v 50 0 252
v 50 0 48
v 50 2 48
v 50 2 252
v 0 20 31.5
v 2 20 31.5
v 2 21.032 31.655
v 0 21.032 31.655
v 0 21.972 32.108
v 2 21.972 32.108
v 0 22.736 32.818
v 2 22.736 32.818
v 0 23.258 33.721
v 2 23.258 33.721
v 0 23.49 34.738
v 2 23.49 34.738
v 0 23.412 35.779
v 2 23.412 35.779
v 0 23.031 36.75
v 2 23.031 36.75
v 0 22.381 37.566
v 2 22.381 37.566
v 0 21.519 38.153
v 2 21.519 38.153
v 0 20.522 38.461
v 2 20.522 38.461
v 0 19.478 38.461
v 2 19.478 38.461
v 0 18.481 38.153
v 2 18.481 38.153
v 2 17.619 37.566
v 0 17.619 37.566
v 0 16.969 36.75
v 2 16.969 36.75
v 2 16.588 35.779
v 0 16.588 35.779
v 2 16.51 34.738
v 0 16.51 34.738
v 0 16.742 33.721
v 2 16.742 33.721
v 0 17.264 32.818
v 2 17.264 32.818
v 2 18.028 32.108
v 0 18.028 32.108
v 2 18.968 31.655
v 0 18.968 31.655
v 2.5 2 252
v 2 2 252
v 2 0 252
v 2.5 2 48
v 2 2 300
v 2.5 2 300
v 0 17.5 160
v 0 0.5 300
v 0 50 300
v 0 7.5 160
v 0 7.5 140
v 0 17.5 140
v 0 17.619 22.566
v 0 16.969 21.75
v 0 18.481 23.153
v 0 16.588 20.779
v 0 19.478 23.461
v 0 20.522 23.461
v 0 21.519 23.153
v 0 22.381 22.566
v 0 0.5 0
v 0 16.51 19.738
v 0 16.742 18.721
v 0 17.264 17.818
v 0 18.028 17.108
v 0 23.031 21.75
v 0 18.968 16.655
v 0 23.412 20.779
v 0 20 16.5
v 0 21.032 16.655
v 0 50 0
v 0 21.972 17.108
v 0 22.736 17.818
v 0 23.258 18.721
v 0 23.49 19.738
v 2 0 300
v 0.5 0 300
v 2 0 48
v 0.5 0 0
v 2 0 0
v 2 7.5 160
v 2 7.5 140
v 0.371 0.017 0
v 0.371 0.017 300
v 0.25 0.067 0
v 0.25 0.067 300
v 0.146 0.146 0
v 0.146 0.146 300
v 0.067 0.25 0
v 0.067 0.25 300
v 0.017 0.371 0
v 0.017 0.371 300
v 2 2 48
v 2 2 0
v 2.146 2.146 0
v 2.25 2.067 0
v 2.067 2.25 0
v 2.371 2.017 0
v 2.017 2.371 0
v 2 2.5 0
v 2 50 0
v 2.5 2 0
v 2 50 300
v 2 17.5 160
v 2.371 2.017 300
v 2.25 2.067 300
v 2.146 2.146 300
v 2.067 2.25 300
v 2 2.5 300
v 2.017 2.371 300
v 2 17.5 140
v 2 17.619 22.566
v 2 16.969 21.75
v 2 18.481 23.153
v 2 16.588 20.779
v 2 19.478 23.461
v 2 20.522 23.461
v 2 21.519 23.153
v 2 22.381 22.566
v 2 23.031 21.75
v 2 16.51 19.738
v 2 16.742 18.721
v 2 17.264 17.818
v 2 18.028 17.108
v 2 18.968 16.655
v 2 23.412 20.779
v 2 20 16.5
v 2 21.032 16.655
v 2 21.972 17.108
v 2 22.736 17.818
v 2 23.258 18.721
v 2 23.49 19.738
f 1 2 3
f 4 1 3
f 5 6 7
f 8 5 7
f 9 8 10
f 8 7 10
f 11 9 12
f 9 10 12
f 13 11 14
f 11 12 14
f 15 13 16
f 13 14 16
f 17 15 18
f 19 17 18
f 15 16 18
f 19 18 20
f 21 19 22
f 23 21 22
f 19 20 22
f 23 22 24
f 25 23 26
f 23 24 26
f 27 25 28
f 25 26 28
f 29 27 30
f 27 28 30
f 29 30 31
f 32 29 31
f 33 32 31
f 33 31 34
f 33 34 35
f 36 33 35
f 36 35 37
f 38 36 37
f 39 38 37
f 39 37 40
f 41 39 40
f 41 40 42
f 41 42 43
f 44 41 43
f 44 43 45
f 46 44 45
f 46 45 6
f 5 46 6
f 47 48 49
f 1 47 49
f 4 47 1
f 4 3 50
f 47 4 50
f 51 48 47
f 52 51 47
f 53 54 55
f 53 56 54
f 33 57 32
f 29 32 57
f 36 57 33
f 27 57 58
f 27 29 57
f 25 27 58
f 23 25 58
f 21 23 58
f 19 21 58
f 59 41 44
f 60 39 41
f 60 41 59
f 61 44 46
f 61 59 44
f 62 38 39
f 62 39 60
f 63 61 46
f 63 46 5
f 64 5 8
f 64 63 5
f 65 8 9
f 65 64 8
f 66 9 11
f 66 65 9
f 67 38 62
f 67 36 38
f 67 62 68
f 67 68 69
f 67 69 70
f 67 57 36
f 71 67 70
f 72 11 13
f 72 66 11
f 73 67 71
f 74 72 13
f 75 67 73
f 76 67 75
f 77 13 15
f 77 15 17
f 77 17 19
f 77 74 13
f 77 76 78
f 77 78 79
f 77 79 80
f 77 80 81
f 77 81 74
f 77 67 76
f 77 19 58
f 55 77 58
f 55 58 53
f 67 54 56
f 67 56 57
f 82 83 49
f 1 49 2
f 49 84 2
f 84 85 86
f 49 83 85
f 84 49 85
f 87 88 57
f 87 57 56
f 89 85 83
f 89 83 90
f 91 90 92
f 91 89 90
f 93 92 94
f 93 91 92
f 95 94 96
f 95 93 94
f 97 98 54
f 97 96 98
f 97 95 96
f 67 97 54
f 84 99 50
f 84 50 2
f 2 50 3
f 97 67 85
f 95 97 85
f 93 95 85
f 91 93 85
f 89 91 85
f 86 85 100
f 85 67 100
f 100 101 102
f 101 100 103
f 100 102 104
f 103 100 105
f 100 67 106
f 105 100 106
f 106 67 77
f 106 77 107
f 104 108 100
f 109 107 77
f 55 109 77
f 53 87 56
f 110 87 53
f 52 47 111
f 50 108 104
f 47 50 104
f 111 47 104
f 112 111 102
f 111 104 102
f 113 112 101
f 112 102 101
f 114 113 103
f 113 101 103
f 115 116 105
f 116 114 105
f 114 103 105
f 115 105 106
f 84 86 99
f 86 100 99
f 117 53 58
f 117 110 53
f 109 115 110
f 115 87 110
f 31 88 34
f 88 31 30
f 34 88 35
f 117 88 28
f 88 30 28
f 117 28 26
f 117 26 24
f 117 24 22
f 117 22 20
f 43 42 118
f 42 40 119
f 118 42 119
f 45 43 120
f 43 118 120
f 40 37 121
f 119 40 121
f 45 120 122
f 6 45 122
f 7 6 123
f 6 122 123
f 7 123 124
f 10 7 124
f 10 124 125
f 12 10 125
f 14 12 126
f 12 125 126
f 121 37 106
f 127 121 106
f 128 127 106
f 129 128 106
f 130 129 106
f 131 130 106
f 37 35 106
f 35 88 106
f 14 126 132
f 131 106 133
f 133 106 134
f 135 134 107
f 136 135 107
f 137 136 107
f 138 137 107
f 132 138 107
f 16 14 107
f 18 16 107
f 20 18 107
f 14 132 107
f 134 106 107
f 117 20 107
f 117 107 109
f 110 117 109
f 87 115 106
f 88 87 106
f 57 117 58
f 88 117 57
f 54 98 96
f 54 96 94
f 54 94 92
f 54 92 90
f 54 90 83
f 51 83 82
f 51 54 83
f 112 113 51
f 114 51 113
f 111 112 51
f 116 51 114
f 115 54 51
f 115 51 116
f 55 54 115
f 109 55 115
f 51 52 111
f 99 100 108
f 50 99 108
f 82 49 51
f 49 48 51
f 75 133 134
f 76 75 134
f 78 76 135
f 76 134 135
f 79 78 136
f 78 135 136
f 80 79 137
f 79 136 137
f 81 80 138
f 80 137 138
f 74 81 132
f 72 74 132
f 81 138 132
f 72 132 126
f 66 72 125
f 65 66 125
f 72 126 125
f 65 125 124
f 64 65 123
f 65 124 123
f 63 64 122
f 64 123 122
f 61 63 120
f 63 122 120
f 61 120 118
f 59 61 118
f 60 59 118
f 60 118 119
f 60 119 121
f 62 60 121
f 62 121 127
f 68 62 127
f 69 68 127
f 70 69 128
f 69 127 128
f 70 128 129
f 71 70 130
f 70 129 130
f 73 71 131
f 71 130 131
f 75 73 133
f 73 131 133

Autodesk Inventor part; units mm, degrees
ref_plane "YZ Plane" through (0, 0, 0) normal (1, 0, 0) x (0, 1, 0)
ref_plane "XZ Plane" through (0, 0, 0) normal (0, 1, 0) x (-1, 0, 0)
ref_plane "XY Plane" through (0, 0, 0) normal (0, 0, 1) x (1, 0, 0)
sketch "Szkic1" plane through (0, 0, 0) normal (0, 0, 1) x (1, 0, 0)
  line L0 (-10.1243, 0) -> (60.0207, 0) projected
  line L1 (0, -10.1243) -> (0, 60.0207) projected
  line L2 (0, 50) -> (0, 0.5)
  line L3 (0.5, 0) -> (50, 0)
  line L4 (50, 2) -> (2.5, 2)
  line L5 (2, 2.5) -> (2, 50)
  line L6 (2, 50) -> (0, 50)
  line L7 (50, 0) -> (50, 2)
  arc A0 (2, 2.5) -> (2.5, 2) centre (2.5, 2.5) ccw
  arc A1 (0, 0.5) -> (0.5, 0) centre (0.5, 0.5) ccw
  point P0 (0, 0)
  dimension "d0" = 2
  dimension "d2" = 2
  dimension "d3" = 50
  dimension "d4" = 50
  dimension "d5" = 0.5
extrude "Wyciągnięcie proste1" add sketch "Szkic1" along normal blind 300 contours A1 L1 L6 L5 A0 L4 L7 L0
sketch "Szkic2" plane through (2.5, 2, 0) normal (0, 1, 0) x (1, 0, 0)
  line L0 (-2.5, 0) -> (-2.5, -300) projected
  line L1 (0, 0) -> (-0.5, 0) projected
  line L2 (-0.5, 0) -> (-0.5, -300) projected
  line L3 (0, -300) -> (-0.5, -300) projected
  line L4 (0, 0) -> (0, -300) projected
  line L5 (47.5, -300) -> (-0.5, -300)
  line L6 (-0.5, -300) -> (-0.5, -252)
  line L7 (-0.5, -252) -> (47.5, -252)
  line L8 (47.5, -252) -> (47.5, -300)
  line L9 (47.5, 0) -> (-0.5, 0)
  line L10 (-0.5, 0) -> (-0.5, -48)
  line L11 (-0.5, -48) -> (47.5, -48)
  line L12 (47.5, -48) -> (47.5, 0)
  dimension "d8" = 48
  dimension "d9" = 48
extrude "Wyciągnięcie proste2" cut sketch "Szkic2" against normal through all contours L4 L11 L2 L1 | L9 L12 L11 L4 | L7 L8 L5 L4 | L4 L3 L2 L7
sketch "Szkic3" plane through (2, 2.5, 0) normal (1, 0, 0) x (0, 0, -1)
  line L0 (0, 0) -> (0, 47.5) projected
  line L1 (0, 47.5) -> (-300, 47.5) projected
  circle A0 centre (-20, 17.5) radius 3.5
  point P0 (0, -2.5)
  dimension "d12" = 20
  dimension "d13" = 30
  dimension "d14" = 7
extrude "Wyciągnięcie proste3" cut sketch "Szkic3" against normal through all
pattern_linear "Szyk prostokątny1" count 2 spacing 15 along (0, 0, 1) of "Wyciągnięcie proste3"
sketch "Szkic4" plane through (2, 2.5, 0) normal (1, 0, 0) x (0, 0, -1)
  line L0 (0, 47.5) -> (-300, 47.5) projected
  line L1 (0, 0) -> (-300, 0) projected
  line L2 (-160, 15) -> (-140, 15)
  line L3 (-140, 15) -> (-140, 5)
  line L4 (-140, 5) -> (-160, 5)
  line L5 (-160, 5) -> (-160, 15)
  line L6 (-150, 47.5) -> (-150, -7.9092) construction
  line L7 (-48, -0.5) -> (-252, -0.5) projected
  point P0 (0, -2.5)
  dimension "d20" = 20
  dimension "d21" = 10
  dimension "d22" = 5
extrude "Wyciągnięcie proste4" cut sketch "Szkic4" against normal through all
properties part number "kątownik 3" material "Aluminium 6061"
